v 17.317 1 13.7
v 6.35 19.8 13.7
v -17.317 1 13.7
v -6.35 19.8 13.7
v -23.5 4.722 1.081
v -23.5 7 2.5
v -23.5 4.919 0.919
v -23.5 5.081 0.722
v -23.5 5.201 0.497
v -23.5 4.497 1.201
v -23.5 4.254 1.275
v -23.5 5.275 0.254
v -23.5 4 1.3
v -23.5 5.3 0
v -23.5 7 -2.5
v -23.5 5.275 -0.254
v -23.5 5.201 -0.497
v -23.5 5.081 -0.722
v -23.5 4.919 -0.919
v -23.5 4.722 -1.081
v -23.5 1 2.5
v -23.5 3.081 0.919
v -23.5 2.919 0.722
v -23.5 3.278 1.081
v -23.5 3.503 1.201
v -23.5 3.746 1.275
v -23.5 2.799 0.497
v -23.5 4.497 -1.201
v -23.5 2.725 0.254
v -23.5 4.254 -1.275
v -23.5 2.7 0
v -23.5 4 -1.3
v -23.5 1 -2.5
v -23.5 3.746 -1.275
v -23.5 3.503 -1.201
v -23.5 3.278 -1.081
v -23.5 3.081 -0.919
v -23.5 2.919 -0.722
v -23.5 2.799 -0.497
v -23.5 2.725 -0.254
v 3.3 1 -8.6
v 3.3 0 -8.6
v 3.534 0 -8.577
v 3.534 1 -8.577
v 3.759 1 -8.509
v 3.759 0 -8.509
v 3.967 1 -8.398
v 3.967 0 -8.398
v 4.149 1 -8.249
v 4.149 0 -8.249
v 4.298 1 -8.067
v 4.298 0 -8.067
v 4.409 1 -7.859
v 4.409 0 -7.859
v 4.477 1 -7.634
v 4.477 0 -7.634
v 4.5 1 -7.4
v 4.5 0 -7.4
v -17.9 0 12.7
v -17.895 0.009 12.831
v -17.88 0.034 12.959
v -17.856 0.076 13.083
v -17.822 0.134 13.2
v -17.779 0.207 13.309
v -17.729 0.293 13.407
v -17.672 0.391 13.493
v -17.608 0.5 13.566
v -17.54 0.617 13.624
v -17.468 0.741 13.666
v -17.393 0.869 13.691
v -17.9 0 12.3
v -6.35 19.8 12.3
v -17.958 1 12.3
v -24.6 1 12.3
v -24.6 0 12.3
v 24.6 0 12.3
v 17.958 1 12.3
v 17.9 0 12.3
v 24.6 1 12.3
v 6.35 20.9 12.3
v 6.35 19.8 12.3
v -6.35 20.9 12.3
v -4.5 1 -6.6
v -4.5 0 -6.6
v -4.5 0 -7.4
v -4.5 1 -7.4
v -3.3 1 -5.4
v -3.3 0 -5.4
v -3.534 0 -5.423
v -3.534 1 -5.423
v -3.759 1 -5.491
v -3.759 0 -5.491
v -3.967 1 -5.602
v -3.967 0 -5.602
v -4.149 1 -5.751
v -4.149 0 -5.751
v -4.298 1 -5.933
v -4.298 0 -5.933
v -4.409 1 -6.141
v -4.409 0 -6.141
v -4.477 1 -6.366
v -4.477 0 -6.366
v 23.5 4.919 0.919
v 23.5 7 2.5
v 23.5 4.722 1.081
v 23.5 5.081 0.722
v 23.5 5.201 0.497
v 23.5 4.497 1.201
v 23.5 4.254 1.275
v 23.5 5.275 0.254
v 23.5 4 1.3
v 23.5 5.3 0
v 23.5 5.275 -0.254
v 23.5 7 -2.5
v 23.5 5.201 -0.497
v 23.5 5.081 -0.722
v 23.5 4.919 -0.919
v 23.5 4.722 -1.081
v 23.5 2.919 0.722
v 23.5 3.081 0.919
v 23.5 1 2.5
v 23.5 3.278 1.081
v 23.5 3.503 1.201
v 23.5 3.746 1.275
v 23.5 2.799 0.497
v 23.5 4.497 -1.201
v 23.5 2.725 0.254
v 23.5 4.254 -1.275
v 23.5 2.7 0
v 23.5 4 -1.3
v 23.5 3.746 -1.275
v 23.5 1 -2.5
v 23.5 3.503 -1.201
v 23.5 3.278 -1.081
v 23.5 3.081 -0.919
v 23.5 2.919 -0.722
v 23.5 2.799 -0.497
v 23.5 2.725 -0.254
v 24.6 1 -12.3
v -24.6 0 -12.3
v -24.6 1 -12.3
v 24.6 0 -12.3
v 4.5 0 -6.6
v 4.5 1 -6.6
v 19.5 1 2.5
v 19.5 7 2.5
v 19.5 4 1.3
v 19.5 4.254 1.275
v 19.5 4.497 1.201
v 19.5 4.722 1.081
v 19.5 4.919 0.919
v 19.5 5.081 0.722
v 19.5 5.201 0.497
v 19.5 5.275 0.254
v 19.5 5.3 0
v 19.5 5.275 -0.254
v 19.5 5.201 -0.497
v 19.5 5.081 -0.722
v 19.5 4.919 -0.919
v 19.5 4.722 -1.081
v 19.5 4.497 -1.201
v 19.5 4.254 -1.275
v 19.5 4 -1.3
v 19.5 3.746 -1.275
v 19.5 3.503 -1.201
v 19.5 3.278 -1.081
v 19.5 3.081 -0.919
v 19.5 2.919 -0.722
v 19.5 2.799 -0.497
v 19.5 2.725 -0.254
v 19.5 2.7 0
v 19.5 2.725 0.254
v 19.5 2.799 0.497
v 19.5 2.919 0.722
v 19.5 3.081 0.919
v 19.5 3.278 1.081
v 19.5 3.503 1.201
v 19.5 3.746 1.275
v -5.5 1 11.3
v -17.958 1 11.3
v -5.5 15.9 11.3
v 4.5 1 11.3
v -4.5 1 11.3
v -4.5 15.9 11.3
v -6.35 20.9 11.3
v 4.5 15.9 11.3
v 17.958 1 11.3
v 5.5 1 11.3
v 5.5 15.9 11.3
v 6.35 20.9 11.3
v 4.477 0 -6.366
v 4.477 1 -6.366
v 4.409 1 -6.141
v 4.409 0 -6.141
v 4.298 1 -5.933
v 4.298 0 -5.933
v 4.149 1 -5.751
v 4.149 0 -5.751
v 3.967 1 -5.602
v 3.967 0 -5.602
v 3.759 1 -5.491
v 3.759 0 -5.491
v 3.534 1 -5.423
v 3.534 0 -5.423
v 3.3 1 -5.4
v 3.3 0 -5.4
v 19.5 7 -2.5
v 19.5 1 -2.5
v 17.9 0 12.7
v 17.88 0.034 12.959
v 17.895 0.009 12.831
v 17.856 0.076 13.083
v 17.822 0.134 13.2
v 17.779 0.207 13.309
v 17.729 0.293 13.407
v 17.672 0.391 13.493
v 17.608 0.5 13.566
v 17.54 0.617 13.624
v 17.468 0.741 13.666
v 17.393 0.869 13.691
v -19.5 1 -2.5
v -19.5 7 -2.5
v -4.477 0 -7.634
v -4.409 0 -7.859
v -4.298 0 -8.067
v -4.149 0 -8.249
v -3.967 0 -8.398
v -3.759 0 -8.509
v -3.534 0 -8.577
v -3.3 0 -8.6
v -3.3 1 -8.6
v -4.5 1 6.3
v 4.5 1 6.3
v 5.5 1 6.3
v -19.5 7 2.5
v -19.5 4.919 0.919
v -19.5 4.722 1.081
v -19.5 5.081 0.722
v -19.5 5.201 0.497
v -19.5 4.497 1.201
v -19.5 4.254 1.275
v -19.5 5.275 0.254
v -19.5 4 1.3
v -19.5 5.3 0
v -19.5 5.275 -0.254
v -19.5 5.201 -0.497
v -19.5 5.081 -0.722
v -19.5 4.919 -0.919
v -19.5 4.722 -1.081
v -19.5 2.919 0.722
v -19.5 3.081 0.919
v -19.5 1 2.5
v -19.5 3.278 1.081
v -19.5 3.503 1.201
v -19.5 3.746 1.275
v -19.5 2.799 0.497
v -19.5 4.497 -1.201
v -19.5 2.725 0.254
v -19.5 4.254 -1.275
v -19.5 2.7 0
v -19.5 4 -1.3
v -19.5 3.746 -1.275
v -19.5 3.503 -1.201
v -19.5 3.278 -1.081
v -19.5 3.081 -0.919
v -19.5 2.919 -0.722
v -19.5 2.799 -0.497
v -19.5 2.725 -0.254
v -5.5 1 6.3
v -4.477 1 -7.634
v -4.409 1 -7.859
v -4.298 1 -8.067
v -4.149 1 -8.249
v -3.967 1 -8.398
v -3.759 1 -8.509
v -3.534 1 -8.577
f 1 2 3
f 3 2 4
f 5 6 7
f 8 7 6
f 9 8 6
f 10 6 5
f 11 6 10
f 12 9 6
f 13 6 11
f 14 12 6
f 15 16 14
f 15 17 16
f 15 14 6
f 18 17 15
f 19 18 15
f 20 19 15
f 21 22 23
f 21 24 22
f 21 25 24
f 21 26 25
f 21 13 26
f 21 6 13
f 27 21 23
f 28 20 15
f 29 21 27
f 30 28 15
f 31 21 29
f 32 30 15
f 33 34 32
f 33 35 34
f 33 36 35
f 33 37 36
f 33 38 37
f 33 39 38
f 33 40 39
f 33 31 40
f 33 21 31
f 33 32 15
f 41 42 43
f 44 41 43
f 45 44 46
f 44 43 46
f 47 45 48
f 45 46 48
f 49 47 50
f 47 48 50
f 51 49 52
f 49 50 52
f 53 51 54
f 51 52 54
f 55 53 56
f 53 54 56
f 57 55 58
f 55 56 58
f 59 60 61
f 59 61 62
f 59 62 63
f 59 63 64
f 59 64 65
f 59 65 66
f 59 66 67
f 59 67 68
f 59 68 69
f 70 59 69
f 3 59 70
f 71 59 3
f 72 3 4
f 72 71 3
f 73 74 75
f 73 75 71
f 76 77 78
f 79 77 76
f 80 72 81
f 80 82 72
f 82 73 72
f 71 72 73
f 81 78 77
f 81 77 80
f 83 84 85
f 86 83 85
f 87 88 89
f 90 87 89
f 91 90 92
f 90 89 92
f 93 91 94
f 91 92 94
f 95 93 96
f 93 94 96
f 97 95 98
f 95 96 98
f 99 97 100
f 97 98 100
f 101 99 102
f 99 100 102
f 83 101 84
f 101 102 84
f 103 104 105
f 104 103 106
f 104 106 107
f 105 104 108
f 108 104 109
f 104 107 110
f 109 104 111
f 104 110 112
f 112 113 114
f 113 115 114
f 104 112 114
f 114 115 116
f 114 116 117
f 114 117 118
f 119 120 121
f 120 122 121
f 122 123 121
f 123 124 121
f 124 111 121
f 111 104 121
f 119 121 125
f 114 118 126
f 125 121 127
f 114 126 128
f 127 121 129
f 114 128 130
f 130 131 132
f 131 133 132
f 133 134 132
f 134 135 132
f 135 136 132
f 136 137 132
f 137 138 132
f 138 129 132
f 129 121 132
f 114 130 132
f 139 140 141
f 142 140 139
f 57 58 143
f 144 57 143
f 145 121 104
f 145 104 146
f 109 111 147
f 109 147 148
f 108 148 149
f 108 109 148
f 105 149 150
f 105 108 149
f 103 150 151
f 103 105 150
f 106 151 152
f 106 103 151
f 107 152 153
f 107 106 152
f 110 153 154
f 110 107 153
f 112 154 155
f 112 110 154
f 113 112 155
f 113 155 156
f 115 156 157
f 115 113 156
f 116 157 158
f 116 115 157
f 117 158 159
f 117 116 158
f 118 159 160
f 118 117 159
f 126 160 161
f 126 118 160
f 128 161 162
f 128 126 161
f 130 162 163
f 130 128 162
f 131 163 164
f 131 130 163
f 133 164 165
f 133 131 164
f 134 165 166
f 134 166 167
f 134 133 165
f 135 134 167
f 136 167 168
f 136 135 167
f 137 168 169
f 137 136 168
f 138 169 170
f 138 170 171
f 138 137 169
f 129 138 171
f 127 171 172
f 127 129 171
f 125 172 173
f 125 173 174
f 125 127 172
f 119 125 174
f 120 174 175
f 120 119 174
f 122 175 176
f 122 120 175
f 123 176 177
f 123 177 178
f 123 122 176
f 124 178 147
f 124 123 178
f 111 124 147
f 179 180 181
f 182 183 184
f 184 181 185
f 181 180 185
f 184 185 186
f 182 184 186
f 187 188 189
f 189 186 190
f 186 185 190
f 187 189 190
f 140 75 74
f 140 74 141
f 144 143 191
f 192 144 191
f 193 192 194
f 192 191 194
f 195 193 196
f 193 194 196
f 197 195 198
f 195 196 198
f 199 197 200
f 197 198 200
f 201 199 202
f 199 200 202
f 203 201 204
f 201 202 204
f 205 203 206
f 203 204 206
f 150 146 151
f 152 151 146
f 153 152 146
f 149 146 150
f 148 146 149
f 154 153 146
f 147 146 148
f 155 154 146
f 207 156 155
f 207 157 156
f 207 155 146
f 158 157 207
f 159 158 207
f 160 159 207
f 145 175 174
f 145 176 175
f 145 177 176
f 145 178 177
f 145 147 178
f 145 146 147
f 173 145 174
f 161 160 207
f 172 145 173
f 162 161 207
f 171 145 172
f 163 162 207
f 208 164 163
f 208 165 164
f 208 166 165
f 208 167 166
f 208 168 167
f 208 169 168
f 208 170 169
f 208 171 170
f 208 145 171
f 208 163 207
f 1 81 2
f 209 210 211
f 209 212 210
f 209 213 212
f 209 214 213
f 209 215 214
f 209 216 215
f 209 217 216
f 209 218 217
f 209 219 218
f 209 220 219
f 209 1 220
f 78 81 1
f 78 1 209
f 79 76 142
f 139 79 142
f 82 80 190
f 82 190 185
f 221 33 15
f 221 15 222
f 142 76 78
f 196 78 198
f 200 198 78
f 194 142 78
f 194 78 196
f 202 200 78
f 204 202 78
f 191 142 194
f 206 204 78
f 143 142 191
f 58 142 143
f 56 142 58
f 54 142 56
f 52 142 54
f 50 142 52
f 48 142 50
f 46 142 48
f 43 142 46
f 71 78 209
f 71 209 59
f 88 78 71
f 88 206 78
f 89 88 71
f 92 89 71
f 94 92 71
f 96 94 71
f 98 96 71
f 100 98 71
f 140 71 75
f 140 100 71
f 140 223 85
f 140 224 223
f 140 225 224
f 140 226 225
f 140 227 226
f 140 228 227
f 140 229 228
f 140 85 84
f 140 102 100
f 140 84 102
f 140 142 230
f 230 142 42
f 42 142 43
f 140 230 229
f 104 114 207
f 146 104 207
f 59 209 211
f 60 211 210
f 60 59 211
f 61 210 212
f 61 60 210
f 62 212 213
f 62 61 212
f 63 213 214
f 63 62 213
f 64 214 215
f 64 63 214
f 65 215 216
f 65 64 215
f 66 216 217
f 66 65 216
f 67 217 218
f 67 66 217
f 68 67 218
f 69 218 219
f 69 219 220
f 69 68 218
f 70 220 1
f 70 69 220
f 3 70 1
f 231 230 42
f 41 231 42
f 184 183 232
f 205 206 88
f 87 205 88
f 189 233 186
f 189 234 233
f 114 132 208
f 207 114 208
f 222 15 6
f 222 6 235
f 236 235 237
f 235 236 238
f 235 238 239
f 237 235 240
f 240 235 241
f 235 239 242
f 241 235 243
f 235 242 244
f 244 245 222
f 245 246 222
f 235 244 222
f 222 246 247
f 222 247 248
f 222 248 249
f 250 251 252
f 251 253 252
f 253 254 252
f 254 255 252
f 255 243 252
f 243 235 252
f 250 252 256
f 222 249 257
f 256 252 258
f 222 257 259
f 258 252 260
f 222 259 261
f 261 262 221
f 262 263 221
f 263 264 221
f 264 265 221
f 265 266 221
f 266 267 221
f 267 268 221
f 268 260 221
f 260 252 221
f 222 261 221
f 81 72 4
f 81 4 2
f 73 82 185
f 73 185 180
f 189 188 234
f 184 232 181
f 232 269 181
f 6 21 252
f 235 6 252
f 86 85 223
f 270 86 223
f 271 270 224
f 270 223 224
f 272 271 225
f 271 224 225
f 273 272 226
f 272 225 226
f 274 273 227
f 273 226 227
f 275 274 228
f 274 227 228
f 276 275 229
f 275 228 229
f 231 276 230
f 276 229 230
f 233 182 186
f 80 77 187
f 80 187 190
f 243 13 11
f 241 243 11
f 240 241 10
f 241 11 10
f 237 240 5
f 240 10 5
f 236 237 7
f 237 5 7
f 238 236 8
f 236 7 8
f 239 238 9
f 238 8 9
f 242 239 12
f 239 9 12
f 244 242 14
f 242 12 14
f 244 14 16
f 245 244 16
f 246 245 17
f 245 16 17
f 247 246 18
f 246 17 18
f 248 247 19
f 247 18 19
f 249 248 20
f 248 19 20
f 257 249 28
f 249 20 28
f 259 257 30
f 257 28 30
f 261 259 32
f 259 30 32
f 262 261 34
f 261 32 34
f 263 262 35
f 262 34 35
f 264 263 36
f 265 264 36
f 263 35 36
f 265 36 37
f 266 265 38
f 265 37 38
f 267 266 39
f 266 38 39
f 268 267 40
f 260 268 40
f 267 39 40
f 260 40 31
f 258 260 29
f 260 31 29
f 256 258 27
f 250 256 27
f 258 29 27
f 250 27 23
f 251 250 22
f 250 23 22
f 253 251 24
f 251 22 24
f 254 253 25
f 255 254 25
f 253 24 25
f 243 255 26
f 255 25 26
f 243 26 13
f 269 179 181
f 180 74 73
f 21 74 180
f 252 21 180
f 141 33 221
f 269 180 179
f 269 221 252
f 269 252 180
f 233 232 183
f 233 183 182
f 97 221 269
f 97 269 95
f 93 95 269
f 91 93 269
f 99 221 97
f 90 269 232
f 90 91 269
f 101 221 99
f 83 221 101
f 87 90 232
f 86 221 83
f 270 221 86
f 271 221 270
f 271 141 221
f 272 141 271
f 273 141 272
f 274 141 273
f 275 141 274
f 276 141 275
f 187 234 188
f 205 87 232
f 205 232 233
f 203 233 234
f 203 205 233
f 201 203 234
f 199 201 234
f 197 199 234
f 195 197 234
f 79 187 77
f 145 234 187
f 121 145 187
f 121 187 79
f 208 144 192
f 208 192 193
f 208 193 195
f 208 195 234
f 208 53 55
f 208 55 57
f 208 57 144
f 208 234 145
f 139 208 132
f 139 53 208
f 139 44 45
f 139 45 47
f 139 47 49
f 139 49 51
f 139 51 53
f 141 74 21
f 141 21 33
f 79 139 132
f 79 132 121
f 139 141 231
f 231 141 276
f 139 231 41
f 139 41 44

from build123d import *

# Parameters (mm, degrees)
SKIZZE1_W                       = 49.2
SKIZZE1_H                       = 24.6
AUFSATZ_LINEAR_AUSTRAGEN1_DEPTH = 1
AUFSATZ_LINEAR_AUSTRAGEN2_DEPTH = 1.4
AUFSATZ_LINEAR_AUSTRAGEN3_DEPTH = 1
AUFSATZ_LINEAR_AUSTRAGEN4_DEPTH = 0.5
SKIZZE6_W                       = 4
SKIZZE6_H                       = 5
AUFSATZ_LINEAR_AUSTRAGEN5_DEPTH = 6
SKIZZE7_R                       = 1.3
SCHNITT_LINEAR_AUSTRAGEN1_DEPTH = 4
VERRUNDUNG1_R                   = 1
SCHNITT_LINEAR_AUSTRAGEN2_DEPTH = 1


with BuildPart() as part:
    # Skizze1 → Aufsatz-Linear austragen1 (new body)
    with BuildSketch(Plane(origin=(0, 0, 0), x_dir=(1, 0, 0), z_dir=(0, 1, 0))):
        Rectangle(SKIZZE1_W, SKIZZE1_H)
    extrude(amount=AUFSATZ_LINEAR_AUSTRAGEN1_DEPTH)

    # Skizze2 → Aufsatz-Linear austragen2 (add)
    with BuildSketch(Plane.XY.offset(12.3)):
        Polygon((17.9, 0), (-17.9, 0), (-6.35, 19.8), (6.35, 19.8), align=None)
    extrude(amount=AUFSATZ_LINEAR_AUSTRAGEN2_DEPTH)

    # Skizze4 → Aufsatz-Linear austragen3 (add)
    with BuildSketch(Plane(origin=(0, 0, 12.3), x_dir=(-1, 0, 0), z_dir=(0, 0, -1))):
        Polygon((6.35, 20.9), (17.958333333, 1), (-17.958333333, 1), (-6.35, 20.9), align=None)
    extrude(amount=AUFSATZ_LINEAR_AUSTRAGEN3_DEPTH)

    # Skizze5 → Aufsatz-Linear austragen4 (add, symmetric)
    with BuildSketch(Plane(origin=(5, 0, 0), x_dir=(0, 0, -1), z_dir=(1, 0, 0))):
        Polygon((-6.3, 1), (-11.3, 15.9), (-11.3, 1), align=None)
    aufsatz_linear_austragen4 = extrude(amount=AUFSATZ_LINEAR_AUSTRAGEN4_DEPTH, both=True)

    # Spiegeln1: Aufsatz-Linear austragen4 across plane
    add(aufsatz_linear_austragen4.mirror(Plane(origin=(0, 0, 0), x_dir=(0, 0, 1), z_dir=(1, 0, 0))))

    # Skizze6 → Aufsatz-Linear austragen5 (add)
    with BuildSketch(Plane(origin=(0, 1, 0), x_dir=(1, 0, 0), z_dir=(0, 1, 0))):
        with Locations((-21.5, 0)):
            Rectangle(SKIZZE6_W, SKIZZE6_H)
    aufsatz_linear_austragen5 = extrude(amount=AUFSATZ_LINEAR_AUSTRAGEN5_DEPTH)

    # Skizze7 → Schnitt-Linear austragen1 (cut)
    with BuildSketch(Plane.ZY.offset(23.5)):
        with Locations((0, 4)):
            Circle(SKIZZE7_R)
    schnitt_linear_austragen1 = extrude(amount=-SCHNITT_LINEAR_AUSTRAGEN1_DEPTH, mode=Mode.SUBTRACT)

    # Spiegeln2: Aufsatz-Linear austragen5, Schnitt-Linear austragen1 across plane
    add(aufsatz_linear_austragen5.mirror(Plane(origin=(0, 0, 0), x_dir=(0, 0, 1), z_dir=(1, 0, 0))))
    add(schnitt_linear_austragen1.mirror(Plane(origin=(0, 0, 0), x_dir=(0, 0, 1), z_dir=(1, 0, 0))), mode=Mode.SUBTRACT)

    # Verrundung1
    verrundung1_edges = [part.edges().sort_by_distance(p)[0] for p in [
        (0, 0, 13.7),
    ]]
    fillet(verrundung1_edges, radius=VERRUNDUNG1_R)

    # Skizze8 → Schnitt-Linear austragen2 (cut)
    with BuildSketch(Plane.XZ):
        with BuildLine():
            Line((3.3, -5.4), (-3.3, -5.4))
            ThreePointArc((-3.3, -5.4), (-4.148528137, -5.751471863), (-4.5, -6.6))
            Line((-4.5, -6.6), (-4.5, -7.4))
            ThreePointArc((-4.5, -7.4), (-4.148528137, -8.248528137), (-3.3, -8.6))
            Line((-3.3, -8.6), (3.3, -8.6))
            ThreePointArc((3.3, -8.6), (4.148528137, -8.248528137), (4.5, -7.4))
            Line((4.5, -7.4), (4.5, -6.6))
            ThreePointArc((4.5, -6.6), (4.148528137, -5.751471863), (3.3, -5.4))
        make_face()
    extrude(amount=-SCHNITT_LINEAR_AUSTRAGEN2_DEPTH, mode=Mode.SUBTRACT)


solid = part.part
